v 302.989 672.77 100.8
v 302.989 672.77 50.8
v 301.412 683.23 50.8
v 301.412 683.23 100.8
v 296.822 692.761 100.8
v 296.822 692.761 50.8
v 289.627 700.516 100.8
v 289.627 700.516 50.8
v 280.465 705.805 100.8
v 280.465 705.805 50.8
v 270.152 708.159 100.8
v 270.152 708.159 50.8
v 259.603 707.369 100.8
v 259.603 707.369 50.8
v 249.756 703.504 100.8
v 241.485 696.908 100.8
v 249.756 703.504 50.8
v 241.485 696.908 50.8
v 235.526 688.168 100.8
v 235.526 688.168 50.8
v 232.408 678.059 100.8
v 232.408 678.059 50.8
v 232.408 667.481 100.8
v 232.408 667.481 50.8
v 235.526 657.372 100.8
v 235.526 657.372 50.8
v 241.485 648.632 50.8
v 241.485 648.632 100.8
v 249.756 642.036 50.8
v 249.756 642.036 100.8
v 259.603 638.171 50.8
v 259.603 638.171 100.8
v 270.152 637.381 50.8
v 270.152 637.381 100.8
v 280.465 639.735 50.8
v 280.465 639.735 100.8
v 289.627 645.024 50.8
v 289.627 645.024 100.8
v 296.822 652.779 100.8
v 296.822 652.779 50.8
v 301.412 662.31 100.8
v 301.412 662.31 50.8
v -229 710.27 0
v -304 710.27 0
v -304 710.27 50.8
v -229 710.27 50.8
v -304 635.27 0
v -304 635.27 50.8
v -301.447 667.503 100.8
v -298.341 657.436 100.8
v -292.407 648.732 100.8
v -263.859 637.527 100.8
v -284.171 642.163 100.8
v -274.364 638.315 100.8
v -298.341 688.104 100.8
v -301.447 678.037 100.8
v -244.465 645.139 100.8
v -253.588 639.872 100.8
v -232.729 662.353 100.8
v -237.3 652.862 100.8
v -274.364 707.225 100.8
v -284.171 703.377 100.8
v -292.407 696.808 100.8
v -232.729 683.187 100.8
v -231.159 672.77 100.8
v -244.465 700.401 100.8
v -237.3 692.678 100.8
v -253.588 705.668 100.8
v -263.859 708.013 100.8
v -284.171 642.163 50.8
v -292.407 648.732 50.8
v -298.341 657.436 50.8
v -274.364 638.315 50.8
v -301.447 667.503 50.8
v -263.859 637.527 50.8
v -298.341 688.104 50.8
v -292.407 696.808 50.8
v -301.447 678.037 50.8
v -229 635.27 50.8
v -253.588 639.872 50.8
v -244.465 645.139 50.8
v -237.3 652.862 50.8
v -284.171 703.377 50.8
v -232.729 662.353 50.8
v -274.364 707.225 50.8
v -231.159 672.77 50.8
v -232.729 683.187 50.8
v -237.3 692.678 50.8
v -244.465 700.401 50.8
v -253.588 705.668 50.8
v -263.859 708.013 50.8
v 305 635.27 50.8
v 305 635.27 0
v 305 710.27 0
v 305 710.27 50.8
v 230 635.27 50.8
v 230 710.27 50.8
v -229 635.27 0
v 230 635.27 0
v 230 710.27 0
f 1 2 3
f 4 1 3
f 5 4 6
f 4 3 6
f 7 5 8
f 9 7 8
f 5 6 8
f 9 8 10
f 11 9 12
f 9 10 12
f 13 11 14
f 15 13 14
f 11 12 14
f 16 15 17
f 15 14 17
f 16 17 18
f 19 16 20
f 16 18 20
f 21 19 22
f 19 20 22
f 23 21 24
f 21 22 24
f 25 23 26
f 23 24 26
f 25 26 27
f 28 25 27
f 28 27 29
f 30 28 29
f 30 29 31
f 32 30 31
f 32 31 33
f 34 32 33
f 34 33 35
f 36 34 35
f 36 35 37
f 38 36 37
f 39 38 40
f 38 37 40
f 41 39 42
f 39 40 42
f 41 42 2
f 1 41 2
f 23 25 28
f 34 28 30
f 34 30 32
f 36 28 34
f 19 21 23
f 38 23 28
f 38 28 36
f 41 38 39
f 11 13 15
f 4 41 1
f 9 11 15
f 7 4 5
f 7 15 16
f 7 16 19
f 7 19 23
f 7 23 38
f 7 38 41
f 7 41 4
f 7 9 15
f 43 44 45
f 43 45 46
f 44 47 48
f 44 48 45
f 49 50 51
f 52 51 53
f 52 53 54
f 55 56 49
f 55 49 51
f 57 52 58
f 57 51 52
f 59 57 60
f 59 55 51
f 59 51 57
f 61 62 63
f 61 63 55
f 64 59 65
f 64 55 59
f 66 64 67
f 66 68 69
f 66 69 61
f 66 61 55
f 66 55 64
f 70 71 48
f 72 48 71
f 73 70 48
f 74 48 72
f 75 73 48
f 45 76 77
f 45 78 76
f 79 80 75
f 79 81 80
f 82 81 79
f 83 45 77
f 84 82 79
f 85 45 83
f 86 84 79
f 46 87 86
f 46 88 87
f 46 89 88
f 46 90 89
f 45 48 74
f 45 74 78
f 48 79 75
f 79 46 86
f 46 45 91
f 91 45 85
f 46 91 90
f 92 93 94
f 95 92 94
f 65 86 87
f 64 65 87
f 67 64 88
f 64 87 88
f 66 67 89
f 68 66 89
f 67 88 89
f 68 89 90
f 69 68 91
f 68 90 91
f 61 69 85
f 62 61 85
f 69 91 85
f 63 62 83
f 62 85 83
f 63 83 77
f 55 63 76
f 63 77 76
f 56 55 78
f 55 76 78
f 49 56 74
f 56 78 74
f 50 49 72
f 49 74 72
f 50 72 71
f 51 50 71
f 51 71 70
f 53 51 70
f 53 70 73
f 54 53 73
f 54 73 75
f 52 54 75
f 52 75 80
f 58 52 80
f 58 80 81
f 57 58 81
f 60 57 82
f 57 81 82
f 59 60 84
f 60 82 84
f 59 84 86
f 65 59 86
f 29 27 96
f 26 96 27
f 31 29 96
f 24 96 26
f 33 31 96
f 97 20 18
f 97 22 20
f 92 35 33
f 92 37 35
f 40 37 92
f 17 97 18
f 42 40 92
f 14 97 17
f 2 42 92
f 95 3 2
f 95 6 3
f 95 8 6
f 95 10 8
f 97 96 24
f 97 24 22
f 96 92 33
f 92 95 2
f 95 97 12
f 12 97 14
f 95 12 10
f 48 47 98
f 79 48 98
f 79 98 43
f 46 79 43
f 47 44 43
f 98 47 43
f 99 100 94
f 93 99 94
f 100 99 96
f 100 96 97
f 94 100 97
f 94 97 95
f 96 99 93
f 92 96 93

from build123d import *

# Parameters (mm, degrees)
SKETCH1_W             = 75
SKETCH1_H             = 75
BOSS_EXTRUDE1_DEPTH   = 50.8
BOSS_EXTRUDE1_2_DEPTH = 50.8
SKETCH2_R             = 35.488594607
SKETCH2_R_2           = 35.341352145
BOSS_EXTRUDE2_DEPTH   = 50


with BuildPart() as part:
    # Sketch1 → Boss-Extrude1 (new body)
    with BuildSketch(Plane.XY):
        with Locations((267.5, 672.77)):
            Rectangle(SKETCH1_W, SKETCH1_H)
    extrude(amount=BOSS_EXTRUDE1_DEPTH)



with BuildPart() as body_2:
    # Sketch1 → Boss-Extrude1 2 (new body)
    with BuildSketch(Plane.XY):
        with Locations((-266.5, 672.77)):
            Rectangle(SKETCH1_W, SKETCH1_H)
    extrude(amount=BOSS_EXTRUDE1_2_DEPTH)


with BuildPart() as part_1:
    add(part.part)

    add(body_2.part)  # Boss-Extrude2 merges body 2
    # Sketch2 → Boss-Extrude2 (add)
    with BuildSketch(Plane.XY.offset(50.8)):
        with Locations((267.5, 672.77)):
            Circle(SKETCH2_R)
        with Locations((-266.5, 672.77)):
            Circle(SKETCH2_R_2)
    extrude(amount=BOSS_EXTRUDE2_DEPTH)


solid = part_1.part
